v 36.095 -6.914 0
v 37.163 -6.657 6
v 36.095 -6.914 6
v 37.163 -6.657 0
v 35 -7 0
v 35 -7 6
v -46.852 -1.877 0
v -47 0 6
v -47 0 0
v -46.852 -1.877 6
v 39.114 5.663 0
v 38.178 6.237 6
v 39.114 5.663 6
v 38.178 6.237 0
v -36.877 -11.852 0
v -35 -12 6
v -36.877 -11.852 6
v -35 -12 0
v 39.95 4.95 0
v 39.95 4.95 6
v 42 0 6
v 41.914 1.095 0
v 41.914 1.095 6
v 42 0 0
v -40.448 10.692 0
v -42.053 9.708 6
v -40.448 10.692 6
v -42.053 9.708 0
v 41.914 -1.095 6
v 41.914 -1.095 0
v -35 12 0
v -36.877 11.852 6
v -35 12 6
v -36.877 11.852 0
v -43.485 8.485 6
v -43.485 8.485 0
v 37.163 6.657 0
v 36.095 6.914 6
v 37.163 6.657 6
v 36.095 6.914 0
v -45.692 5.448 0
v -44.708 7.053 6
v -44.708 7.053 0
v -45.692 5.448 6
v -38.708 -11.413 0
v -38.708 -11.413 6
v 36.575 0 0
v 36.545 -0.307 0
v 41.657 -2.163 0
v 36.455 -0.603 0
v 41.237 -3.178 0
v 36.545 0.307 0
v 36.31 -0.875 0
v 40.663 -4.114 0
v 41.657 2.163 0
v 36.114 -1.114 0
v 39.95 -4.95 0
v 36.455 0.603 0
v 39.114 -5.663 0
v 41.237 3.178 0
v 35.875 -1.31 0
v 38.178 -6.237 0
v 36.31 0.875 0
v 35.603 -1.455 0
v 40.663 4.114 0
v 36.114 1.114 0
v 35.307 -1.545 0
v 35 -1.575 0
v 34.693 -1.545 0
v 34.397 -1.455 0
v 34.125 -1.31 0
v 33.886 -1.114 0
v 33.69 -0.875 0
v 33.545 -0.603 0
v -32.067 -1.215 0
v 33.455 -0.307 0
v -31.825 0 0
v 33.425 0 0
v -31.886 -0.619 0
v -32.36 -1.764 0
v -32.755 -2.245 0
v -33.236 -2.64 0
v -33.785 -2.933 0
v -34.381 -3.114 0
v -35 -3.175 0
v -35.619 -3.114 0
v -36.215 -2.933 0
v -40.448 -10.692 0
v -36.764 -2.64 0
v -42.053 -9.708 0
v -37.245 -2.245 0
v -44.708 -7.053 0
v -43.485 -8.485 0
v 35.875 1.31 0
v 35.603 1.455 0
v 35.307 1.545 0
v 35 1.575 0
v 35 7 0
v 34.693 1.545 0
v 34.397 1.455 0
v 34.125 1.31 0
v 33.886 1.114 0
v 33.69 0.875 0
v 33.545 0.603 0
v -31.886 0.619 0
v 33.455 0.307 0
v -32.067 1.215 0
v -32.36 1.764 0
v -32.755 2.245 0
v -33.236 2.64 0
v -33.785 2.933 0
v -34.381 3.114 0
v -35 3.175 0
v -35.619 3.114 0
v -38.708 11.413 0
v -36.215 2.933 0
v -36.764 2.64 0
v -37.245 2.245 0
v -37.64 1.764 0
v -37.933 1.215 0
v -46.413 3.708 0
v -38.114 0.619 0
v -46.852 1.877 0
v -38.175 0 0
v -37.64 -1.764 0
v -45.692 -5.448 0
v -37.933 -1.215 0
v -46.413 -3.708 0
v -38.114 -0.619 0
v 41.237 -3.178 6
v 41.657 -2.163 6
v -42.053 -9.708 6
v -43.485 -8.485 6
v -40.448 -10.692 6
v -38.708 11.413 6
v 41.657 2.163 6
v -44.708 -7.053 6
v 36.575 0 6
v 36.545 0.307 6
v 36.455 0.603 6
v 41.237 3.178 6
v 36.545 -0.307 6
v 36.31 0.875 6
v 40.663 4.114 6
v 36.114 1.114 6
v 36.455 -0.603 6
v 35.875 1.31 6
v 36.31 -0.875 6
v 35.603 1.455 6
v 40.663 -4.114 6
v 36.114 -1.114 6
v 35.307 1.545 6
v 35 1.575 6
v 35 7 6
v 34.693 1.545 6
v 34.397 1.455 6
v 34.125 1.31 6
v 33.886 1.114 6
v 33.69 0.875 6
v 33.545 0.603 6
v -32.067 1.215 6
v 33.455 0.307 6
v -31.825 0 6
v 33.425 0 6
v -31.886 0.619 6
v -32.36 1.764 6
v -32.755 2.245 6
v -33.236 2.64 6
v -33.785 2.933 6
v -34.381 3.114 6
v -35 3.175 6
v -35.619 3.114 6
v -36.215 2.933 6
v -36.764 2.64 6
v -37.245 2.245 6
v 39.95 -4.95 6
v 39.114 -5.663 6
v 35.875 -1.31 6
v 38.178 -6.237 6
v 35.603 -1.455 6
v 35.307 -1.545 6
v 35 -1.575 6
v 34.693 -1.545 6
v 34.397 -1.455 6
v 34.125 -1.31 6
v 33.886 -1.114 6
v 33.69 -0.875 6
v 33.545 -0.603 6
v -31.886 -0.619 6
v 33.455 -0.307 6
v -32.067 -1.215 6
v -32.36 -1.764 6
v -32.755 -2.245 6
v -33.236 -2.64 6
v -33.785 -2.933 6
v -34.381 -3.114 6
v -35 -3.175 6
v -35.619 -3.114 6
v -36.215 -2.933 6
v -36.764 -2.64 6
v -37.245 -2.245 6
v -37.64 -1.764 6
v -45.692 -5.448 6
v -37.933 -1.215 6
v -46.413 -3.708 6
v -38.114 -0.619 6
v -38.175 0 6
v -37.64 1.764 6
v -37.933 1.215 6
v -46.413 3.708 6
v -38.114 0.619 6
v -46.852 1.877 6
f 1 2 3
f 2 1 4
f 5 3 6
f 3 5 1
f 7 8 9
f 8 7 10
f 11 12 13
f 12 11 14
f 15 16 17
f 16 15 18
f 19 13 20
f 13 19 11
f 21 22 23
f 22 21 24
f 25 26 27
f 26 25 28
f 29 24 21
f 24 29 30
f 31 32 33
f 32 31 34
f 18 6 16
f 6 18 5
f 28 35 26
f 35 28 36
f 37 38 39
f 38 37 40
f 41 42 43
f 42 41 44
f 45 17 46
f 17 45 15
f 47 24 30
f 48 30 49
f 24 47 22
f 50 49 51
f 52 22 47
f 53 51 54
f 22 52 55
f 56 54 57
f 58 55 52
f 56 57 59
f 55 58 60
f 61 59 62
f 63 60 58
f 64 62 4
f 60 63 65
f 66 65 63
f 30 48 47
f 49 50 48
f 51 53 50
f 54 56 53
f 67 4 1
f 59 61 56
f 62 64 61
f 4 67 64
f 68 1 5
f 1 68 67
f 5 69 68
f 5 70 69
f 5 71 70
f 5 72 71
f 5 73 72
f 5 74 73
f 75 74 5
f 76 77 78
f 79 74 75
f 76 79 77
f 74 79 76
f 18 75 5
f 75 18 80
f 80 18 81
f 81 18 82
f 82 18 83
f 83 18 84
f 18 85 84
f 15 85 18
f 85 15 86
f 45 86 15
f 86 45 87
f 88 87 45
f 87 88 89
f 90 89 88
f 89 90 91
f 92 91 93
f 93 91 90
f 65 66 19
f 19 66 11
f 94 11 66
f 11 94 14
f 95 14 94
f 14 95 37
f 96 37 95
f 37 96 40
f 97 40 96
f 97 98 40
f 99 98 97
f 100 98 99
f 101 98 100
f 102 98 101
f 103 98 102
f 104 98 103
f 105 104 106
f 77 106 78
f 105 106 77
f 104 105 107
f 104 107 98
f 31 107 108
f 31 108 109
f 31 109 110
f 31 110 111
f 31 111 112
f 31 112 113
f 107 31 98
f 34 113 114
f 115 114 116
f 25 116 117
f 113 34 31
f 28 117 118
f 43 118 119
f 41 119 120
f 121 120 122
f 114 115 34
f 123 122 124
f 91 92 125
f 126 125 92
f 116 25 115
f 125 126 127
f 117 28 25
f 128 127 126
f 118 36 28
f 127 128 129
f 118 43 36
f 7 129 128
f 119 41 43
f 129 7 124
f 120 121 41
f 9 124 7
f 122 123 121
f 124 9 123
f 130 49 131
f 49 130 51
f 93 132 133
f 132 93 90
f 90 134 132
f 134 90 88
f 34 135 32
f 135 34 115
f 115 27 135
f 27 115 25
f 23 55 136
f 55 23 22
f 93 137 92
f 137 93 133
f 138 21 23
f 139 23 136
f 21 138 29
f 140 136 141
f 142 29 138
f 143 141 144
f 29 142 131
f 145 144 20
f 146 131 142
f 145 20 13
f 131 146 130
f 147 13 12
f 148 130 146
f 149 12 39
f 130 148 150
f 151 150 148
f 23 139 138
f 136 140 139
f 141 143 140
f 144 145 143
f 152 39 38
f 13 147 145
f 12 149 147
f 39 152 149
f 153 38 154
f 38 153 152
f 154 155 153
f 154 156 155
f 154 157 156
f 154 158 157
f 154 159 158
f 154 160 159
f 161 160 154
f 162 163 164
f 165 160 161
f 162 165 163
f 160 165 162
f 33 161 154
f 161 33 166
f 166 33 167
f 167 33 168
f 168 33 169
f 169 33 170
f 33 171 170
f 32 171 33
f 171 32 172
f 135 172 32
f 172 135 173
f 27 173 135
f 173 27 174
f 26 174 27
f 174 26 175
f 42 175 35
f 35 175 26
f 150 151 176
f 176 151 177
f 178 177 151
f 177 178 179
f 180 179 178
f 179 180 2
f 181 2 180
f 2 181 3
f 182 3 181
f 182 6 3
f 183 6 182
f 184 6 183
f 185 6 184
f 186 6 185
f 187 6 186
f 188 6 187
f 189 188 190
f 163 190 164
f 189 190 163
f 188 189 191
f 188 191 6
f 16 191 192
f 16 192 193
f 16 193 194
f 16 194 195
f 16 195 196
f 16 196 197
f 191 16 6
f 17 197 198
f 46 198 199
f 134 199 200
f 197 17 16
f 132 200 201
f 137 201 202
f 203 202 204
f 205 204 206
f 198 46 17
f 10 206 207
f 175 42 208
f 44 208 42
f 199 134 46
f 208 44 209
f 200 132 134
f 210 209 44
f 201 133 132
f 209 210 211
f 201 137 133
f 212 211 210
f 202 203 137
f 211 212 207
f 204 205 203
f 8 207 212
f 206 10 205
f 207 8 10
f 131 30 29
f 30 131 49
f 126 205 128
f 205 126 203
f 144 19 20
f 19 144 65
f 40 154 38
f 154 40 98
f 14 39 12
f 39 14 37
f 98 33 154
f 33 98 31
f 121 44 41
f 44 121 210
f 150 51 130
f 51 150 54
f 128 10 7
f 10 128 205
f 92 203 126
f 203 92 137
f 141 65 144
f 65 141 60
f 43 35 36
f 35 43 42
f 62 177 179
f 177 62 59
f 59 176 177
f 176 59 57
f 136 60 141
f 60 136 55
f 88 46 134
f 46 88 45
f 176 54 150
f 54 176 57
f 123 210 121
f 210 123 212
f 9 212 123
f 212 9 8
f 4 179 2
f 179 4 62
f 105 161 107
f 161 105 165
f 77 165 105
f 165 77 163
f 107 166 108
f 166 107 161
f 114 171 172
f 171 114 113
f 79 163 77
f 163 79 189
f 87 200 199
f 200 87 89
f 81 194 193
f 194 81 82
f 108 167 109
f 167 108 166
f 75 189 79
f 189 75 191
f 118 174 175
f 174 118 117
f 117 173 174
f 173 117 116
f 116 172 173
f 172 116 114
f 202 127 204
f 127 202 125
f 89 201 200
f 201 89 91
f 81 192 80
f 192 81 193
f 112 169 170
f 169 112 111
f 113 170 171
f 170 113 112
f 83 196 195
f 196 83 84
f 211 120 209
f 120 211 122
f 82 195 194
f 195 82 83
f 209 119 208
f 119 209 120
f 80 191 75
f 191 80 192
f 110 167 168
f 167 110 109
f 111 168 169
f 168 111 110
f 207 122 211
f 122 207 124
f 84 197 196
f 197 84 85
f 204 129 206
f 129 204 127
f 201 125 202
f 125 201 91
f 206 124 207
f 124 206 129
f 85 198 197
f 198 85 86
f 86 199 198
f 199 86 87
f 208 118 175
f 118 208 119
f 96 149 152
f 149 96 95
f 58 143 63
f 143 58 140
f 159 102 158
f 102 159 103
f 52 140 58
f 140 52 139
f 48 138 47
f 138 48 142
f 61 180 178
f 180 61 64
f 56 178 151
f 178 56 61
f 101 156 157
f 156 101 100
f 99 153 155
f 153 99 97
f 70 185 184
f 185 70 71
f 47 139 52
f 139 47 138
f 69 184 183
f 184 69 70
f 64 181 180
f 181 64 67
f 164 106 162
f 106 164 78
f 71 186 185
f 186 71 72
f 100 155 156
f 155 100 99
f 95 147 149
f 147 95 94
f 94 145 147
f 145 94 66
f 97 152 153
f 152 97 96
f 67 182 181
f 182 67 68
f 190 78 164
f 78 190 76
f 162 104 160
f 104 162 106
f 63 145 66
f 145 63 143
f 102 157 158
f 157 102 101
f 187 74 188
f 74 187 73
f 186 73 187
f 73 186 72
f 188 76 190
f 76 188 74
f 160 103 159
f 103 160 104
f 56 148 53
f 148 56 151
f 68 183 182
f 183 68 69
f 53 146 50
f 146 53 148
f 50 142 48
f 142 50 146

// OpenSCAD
$fn = 32;

// ----------------------------------------------------------------------
// Lever: 70 mm between the bosses, 6 mm thick, smooth outline
// ----------------------------------------------------------------------

// --- parameters (mm) ---
lever_l = 70;             // distance between the boss centres
boss_a = 24;              // first boss diameter
boss_b = 14;              // second boss diameter
bore_a = 6.35;            // first bore
bore_b = 3.15;            // second bore
lever_t = 6;              // lever thickness

lever_profile = [[-47, 0], [-46.852, -1.877], [-46.413, -3.708], [-45.692, -5.448], [-44.708, -7.053], [-43.485, -8.485], [-42.053, -9.708], [-40.448, -10.692], [-38.708, -11.413], [-36.877, -11.852], [-35, -12], [35, -7], [36.095, -6.914], [37.163, -6.657], [38.178, -6.237], [39.114, -5.663], [39.95, -4.95], [40.663, -4.114], [41.237, -3.178], [41.657, -2.163], [41.914, -1.095], [42, 0], [41.914, 1.095], [41.657, 2.163], [41.237, 3.178], [40.663, 4.114], [39.95, 4.95], [39.114, 5.663], [38.178, 6.237], [37.163, 6.657], [36.095, 6.914], [35, 7], [-35, 12], [-36.877, 11.852], [-38.708, 11.413], [-40.448, 10.692], [-42.053, 9.708], [-43.485, 8.485], [-44.708, 7.053], [-45.692, 5.448], [-46.413, 3.708], [-46.852, 1.877]];

difference() {
  linear_extrude(height = lever_t) polygon(lever_profile);
  translate([-35, 0, -2.5]) cylinder(h = lever_t + 5, d = bore_a);
  translate([35, 0, -2.5]) cylinder(h = lever_t + 5, d = bore_b);
}
